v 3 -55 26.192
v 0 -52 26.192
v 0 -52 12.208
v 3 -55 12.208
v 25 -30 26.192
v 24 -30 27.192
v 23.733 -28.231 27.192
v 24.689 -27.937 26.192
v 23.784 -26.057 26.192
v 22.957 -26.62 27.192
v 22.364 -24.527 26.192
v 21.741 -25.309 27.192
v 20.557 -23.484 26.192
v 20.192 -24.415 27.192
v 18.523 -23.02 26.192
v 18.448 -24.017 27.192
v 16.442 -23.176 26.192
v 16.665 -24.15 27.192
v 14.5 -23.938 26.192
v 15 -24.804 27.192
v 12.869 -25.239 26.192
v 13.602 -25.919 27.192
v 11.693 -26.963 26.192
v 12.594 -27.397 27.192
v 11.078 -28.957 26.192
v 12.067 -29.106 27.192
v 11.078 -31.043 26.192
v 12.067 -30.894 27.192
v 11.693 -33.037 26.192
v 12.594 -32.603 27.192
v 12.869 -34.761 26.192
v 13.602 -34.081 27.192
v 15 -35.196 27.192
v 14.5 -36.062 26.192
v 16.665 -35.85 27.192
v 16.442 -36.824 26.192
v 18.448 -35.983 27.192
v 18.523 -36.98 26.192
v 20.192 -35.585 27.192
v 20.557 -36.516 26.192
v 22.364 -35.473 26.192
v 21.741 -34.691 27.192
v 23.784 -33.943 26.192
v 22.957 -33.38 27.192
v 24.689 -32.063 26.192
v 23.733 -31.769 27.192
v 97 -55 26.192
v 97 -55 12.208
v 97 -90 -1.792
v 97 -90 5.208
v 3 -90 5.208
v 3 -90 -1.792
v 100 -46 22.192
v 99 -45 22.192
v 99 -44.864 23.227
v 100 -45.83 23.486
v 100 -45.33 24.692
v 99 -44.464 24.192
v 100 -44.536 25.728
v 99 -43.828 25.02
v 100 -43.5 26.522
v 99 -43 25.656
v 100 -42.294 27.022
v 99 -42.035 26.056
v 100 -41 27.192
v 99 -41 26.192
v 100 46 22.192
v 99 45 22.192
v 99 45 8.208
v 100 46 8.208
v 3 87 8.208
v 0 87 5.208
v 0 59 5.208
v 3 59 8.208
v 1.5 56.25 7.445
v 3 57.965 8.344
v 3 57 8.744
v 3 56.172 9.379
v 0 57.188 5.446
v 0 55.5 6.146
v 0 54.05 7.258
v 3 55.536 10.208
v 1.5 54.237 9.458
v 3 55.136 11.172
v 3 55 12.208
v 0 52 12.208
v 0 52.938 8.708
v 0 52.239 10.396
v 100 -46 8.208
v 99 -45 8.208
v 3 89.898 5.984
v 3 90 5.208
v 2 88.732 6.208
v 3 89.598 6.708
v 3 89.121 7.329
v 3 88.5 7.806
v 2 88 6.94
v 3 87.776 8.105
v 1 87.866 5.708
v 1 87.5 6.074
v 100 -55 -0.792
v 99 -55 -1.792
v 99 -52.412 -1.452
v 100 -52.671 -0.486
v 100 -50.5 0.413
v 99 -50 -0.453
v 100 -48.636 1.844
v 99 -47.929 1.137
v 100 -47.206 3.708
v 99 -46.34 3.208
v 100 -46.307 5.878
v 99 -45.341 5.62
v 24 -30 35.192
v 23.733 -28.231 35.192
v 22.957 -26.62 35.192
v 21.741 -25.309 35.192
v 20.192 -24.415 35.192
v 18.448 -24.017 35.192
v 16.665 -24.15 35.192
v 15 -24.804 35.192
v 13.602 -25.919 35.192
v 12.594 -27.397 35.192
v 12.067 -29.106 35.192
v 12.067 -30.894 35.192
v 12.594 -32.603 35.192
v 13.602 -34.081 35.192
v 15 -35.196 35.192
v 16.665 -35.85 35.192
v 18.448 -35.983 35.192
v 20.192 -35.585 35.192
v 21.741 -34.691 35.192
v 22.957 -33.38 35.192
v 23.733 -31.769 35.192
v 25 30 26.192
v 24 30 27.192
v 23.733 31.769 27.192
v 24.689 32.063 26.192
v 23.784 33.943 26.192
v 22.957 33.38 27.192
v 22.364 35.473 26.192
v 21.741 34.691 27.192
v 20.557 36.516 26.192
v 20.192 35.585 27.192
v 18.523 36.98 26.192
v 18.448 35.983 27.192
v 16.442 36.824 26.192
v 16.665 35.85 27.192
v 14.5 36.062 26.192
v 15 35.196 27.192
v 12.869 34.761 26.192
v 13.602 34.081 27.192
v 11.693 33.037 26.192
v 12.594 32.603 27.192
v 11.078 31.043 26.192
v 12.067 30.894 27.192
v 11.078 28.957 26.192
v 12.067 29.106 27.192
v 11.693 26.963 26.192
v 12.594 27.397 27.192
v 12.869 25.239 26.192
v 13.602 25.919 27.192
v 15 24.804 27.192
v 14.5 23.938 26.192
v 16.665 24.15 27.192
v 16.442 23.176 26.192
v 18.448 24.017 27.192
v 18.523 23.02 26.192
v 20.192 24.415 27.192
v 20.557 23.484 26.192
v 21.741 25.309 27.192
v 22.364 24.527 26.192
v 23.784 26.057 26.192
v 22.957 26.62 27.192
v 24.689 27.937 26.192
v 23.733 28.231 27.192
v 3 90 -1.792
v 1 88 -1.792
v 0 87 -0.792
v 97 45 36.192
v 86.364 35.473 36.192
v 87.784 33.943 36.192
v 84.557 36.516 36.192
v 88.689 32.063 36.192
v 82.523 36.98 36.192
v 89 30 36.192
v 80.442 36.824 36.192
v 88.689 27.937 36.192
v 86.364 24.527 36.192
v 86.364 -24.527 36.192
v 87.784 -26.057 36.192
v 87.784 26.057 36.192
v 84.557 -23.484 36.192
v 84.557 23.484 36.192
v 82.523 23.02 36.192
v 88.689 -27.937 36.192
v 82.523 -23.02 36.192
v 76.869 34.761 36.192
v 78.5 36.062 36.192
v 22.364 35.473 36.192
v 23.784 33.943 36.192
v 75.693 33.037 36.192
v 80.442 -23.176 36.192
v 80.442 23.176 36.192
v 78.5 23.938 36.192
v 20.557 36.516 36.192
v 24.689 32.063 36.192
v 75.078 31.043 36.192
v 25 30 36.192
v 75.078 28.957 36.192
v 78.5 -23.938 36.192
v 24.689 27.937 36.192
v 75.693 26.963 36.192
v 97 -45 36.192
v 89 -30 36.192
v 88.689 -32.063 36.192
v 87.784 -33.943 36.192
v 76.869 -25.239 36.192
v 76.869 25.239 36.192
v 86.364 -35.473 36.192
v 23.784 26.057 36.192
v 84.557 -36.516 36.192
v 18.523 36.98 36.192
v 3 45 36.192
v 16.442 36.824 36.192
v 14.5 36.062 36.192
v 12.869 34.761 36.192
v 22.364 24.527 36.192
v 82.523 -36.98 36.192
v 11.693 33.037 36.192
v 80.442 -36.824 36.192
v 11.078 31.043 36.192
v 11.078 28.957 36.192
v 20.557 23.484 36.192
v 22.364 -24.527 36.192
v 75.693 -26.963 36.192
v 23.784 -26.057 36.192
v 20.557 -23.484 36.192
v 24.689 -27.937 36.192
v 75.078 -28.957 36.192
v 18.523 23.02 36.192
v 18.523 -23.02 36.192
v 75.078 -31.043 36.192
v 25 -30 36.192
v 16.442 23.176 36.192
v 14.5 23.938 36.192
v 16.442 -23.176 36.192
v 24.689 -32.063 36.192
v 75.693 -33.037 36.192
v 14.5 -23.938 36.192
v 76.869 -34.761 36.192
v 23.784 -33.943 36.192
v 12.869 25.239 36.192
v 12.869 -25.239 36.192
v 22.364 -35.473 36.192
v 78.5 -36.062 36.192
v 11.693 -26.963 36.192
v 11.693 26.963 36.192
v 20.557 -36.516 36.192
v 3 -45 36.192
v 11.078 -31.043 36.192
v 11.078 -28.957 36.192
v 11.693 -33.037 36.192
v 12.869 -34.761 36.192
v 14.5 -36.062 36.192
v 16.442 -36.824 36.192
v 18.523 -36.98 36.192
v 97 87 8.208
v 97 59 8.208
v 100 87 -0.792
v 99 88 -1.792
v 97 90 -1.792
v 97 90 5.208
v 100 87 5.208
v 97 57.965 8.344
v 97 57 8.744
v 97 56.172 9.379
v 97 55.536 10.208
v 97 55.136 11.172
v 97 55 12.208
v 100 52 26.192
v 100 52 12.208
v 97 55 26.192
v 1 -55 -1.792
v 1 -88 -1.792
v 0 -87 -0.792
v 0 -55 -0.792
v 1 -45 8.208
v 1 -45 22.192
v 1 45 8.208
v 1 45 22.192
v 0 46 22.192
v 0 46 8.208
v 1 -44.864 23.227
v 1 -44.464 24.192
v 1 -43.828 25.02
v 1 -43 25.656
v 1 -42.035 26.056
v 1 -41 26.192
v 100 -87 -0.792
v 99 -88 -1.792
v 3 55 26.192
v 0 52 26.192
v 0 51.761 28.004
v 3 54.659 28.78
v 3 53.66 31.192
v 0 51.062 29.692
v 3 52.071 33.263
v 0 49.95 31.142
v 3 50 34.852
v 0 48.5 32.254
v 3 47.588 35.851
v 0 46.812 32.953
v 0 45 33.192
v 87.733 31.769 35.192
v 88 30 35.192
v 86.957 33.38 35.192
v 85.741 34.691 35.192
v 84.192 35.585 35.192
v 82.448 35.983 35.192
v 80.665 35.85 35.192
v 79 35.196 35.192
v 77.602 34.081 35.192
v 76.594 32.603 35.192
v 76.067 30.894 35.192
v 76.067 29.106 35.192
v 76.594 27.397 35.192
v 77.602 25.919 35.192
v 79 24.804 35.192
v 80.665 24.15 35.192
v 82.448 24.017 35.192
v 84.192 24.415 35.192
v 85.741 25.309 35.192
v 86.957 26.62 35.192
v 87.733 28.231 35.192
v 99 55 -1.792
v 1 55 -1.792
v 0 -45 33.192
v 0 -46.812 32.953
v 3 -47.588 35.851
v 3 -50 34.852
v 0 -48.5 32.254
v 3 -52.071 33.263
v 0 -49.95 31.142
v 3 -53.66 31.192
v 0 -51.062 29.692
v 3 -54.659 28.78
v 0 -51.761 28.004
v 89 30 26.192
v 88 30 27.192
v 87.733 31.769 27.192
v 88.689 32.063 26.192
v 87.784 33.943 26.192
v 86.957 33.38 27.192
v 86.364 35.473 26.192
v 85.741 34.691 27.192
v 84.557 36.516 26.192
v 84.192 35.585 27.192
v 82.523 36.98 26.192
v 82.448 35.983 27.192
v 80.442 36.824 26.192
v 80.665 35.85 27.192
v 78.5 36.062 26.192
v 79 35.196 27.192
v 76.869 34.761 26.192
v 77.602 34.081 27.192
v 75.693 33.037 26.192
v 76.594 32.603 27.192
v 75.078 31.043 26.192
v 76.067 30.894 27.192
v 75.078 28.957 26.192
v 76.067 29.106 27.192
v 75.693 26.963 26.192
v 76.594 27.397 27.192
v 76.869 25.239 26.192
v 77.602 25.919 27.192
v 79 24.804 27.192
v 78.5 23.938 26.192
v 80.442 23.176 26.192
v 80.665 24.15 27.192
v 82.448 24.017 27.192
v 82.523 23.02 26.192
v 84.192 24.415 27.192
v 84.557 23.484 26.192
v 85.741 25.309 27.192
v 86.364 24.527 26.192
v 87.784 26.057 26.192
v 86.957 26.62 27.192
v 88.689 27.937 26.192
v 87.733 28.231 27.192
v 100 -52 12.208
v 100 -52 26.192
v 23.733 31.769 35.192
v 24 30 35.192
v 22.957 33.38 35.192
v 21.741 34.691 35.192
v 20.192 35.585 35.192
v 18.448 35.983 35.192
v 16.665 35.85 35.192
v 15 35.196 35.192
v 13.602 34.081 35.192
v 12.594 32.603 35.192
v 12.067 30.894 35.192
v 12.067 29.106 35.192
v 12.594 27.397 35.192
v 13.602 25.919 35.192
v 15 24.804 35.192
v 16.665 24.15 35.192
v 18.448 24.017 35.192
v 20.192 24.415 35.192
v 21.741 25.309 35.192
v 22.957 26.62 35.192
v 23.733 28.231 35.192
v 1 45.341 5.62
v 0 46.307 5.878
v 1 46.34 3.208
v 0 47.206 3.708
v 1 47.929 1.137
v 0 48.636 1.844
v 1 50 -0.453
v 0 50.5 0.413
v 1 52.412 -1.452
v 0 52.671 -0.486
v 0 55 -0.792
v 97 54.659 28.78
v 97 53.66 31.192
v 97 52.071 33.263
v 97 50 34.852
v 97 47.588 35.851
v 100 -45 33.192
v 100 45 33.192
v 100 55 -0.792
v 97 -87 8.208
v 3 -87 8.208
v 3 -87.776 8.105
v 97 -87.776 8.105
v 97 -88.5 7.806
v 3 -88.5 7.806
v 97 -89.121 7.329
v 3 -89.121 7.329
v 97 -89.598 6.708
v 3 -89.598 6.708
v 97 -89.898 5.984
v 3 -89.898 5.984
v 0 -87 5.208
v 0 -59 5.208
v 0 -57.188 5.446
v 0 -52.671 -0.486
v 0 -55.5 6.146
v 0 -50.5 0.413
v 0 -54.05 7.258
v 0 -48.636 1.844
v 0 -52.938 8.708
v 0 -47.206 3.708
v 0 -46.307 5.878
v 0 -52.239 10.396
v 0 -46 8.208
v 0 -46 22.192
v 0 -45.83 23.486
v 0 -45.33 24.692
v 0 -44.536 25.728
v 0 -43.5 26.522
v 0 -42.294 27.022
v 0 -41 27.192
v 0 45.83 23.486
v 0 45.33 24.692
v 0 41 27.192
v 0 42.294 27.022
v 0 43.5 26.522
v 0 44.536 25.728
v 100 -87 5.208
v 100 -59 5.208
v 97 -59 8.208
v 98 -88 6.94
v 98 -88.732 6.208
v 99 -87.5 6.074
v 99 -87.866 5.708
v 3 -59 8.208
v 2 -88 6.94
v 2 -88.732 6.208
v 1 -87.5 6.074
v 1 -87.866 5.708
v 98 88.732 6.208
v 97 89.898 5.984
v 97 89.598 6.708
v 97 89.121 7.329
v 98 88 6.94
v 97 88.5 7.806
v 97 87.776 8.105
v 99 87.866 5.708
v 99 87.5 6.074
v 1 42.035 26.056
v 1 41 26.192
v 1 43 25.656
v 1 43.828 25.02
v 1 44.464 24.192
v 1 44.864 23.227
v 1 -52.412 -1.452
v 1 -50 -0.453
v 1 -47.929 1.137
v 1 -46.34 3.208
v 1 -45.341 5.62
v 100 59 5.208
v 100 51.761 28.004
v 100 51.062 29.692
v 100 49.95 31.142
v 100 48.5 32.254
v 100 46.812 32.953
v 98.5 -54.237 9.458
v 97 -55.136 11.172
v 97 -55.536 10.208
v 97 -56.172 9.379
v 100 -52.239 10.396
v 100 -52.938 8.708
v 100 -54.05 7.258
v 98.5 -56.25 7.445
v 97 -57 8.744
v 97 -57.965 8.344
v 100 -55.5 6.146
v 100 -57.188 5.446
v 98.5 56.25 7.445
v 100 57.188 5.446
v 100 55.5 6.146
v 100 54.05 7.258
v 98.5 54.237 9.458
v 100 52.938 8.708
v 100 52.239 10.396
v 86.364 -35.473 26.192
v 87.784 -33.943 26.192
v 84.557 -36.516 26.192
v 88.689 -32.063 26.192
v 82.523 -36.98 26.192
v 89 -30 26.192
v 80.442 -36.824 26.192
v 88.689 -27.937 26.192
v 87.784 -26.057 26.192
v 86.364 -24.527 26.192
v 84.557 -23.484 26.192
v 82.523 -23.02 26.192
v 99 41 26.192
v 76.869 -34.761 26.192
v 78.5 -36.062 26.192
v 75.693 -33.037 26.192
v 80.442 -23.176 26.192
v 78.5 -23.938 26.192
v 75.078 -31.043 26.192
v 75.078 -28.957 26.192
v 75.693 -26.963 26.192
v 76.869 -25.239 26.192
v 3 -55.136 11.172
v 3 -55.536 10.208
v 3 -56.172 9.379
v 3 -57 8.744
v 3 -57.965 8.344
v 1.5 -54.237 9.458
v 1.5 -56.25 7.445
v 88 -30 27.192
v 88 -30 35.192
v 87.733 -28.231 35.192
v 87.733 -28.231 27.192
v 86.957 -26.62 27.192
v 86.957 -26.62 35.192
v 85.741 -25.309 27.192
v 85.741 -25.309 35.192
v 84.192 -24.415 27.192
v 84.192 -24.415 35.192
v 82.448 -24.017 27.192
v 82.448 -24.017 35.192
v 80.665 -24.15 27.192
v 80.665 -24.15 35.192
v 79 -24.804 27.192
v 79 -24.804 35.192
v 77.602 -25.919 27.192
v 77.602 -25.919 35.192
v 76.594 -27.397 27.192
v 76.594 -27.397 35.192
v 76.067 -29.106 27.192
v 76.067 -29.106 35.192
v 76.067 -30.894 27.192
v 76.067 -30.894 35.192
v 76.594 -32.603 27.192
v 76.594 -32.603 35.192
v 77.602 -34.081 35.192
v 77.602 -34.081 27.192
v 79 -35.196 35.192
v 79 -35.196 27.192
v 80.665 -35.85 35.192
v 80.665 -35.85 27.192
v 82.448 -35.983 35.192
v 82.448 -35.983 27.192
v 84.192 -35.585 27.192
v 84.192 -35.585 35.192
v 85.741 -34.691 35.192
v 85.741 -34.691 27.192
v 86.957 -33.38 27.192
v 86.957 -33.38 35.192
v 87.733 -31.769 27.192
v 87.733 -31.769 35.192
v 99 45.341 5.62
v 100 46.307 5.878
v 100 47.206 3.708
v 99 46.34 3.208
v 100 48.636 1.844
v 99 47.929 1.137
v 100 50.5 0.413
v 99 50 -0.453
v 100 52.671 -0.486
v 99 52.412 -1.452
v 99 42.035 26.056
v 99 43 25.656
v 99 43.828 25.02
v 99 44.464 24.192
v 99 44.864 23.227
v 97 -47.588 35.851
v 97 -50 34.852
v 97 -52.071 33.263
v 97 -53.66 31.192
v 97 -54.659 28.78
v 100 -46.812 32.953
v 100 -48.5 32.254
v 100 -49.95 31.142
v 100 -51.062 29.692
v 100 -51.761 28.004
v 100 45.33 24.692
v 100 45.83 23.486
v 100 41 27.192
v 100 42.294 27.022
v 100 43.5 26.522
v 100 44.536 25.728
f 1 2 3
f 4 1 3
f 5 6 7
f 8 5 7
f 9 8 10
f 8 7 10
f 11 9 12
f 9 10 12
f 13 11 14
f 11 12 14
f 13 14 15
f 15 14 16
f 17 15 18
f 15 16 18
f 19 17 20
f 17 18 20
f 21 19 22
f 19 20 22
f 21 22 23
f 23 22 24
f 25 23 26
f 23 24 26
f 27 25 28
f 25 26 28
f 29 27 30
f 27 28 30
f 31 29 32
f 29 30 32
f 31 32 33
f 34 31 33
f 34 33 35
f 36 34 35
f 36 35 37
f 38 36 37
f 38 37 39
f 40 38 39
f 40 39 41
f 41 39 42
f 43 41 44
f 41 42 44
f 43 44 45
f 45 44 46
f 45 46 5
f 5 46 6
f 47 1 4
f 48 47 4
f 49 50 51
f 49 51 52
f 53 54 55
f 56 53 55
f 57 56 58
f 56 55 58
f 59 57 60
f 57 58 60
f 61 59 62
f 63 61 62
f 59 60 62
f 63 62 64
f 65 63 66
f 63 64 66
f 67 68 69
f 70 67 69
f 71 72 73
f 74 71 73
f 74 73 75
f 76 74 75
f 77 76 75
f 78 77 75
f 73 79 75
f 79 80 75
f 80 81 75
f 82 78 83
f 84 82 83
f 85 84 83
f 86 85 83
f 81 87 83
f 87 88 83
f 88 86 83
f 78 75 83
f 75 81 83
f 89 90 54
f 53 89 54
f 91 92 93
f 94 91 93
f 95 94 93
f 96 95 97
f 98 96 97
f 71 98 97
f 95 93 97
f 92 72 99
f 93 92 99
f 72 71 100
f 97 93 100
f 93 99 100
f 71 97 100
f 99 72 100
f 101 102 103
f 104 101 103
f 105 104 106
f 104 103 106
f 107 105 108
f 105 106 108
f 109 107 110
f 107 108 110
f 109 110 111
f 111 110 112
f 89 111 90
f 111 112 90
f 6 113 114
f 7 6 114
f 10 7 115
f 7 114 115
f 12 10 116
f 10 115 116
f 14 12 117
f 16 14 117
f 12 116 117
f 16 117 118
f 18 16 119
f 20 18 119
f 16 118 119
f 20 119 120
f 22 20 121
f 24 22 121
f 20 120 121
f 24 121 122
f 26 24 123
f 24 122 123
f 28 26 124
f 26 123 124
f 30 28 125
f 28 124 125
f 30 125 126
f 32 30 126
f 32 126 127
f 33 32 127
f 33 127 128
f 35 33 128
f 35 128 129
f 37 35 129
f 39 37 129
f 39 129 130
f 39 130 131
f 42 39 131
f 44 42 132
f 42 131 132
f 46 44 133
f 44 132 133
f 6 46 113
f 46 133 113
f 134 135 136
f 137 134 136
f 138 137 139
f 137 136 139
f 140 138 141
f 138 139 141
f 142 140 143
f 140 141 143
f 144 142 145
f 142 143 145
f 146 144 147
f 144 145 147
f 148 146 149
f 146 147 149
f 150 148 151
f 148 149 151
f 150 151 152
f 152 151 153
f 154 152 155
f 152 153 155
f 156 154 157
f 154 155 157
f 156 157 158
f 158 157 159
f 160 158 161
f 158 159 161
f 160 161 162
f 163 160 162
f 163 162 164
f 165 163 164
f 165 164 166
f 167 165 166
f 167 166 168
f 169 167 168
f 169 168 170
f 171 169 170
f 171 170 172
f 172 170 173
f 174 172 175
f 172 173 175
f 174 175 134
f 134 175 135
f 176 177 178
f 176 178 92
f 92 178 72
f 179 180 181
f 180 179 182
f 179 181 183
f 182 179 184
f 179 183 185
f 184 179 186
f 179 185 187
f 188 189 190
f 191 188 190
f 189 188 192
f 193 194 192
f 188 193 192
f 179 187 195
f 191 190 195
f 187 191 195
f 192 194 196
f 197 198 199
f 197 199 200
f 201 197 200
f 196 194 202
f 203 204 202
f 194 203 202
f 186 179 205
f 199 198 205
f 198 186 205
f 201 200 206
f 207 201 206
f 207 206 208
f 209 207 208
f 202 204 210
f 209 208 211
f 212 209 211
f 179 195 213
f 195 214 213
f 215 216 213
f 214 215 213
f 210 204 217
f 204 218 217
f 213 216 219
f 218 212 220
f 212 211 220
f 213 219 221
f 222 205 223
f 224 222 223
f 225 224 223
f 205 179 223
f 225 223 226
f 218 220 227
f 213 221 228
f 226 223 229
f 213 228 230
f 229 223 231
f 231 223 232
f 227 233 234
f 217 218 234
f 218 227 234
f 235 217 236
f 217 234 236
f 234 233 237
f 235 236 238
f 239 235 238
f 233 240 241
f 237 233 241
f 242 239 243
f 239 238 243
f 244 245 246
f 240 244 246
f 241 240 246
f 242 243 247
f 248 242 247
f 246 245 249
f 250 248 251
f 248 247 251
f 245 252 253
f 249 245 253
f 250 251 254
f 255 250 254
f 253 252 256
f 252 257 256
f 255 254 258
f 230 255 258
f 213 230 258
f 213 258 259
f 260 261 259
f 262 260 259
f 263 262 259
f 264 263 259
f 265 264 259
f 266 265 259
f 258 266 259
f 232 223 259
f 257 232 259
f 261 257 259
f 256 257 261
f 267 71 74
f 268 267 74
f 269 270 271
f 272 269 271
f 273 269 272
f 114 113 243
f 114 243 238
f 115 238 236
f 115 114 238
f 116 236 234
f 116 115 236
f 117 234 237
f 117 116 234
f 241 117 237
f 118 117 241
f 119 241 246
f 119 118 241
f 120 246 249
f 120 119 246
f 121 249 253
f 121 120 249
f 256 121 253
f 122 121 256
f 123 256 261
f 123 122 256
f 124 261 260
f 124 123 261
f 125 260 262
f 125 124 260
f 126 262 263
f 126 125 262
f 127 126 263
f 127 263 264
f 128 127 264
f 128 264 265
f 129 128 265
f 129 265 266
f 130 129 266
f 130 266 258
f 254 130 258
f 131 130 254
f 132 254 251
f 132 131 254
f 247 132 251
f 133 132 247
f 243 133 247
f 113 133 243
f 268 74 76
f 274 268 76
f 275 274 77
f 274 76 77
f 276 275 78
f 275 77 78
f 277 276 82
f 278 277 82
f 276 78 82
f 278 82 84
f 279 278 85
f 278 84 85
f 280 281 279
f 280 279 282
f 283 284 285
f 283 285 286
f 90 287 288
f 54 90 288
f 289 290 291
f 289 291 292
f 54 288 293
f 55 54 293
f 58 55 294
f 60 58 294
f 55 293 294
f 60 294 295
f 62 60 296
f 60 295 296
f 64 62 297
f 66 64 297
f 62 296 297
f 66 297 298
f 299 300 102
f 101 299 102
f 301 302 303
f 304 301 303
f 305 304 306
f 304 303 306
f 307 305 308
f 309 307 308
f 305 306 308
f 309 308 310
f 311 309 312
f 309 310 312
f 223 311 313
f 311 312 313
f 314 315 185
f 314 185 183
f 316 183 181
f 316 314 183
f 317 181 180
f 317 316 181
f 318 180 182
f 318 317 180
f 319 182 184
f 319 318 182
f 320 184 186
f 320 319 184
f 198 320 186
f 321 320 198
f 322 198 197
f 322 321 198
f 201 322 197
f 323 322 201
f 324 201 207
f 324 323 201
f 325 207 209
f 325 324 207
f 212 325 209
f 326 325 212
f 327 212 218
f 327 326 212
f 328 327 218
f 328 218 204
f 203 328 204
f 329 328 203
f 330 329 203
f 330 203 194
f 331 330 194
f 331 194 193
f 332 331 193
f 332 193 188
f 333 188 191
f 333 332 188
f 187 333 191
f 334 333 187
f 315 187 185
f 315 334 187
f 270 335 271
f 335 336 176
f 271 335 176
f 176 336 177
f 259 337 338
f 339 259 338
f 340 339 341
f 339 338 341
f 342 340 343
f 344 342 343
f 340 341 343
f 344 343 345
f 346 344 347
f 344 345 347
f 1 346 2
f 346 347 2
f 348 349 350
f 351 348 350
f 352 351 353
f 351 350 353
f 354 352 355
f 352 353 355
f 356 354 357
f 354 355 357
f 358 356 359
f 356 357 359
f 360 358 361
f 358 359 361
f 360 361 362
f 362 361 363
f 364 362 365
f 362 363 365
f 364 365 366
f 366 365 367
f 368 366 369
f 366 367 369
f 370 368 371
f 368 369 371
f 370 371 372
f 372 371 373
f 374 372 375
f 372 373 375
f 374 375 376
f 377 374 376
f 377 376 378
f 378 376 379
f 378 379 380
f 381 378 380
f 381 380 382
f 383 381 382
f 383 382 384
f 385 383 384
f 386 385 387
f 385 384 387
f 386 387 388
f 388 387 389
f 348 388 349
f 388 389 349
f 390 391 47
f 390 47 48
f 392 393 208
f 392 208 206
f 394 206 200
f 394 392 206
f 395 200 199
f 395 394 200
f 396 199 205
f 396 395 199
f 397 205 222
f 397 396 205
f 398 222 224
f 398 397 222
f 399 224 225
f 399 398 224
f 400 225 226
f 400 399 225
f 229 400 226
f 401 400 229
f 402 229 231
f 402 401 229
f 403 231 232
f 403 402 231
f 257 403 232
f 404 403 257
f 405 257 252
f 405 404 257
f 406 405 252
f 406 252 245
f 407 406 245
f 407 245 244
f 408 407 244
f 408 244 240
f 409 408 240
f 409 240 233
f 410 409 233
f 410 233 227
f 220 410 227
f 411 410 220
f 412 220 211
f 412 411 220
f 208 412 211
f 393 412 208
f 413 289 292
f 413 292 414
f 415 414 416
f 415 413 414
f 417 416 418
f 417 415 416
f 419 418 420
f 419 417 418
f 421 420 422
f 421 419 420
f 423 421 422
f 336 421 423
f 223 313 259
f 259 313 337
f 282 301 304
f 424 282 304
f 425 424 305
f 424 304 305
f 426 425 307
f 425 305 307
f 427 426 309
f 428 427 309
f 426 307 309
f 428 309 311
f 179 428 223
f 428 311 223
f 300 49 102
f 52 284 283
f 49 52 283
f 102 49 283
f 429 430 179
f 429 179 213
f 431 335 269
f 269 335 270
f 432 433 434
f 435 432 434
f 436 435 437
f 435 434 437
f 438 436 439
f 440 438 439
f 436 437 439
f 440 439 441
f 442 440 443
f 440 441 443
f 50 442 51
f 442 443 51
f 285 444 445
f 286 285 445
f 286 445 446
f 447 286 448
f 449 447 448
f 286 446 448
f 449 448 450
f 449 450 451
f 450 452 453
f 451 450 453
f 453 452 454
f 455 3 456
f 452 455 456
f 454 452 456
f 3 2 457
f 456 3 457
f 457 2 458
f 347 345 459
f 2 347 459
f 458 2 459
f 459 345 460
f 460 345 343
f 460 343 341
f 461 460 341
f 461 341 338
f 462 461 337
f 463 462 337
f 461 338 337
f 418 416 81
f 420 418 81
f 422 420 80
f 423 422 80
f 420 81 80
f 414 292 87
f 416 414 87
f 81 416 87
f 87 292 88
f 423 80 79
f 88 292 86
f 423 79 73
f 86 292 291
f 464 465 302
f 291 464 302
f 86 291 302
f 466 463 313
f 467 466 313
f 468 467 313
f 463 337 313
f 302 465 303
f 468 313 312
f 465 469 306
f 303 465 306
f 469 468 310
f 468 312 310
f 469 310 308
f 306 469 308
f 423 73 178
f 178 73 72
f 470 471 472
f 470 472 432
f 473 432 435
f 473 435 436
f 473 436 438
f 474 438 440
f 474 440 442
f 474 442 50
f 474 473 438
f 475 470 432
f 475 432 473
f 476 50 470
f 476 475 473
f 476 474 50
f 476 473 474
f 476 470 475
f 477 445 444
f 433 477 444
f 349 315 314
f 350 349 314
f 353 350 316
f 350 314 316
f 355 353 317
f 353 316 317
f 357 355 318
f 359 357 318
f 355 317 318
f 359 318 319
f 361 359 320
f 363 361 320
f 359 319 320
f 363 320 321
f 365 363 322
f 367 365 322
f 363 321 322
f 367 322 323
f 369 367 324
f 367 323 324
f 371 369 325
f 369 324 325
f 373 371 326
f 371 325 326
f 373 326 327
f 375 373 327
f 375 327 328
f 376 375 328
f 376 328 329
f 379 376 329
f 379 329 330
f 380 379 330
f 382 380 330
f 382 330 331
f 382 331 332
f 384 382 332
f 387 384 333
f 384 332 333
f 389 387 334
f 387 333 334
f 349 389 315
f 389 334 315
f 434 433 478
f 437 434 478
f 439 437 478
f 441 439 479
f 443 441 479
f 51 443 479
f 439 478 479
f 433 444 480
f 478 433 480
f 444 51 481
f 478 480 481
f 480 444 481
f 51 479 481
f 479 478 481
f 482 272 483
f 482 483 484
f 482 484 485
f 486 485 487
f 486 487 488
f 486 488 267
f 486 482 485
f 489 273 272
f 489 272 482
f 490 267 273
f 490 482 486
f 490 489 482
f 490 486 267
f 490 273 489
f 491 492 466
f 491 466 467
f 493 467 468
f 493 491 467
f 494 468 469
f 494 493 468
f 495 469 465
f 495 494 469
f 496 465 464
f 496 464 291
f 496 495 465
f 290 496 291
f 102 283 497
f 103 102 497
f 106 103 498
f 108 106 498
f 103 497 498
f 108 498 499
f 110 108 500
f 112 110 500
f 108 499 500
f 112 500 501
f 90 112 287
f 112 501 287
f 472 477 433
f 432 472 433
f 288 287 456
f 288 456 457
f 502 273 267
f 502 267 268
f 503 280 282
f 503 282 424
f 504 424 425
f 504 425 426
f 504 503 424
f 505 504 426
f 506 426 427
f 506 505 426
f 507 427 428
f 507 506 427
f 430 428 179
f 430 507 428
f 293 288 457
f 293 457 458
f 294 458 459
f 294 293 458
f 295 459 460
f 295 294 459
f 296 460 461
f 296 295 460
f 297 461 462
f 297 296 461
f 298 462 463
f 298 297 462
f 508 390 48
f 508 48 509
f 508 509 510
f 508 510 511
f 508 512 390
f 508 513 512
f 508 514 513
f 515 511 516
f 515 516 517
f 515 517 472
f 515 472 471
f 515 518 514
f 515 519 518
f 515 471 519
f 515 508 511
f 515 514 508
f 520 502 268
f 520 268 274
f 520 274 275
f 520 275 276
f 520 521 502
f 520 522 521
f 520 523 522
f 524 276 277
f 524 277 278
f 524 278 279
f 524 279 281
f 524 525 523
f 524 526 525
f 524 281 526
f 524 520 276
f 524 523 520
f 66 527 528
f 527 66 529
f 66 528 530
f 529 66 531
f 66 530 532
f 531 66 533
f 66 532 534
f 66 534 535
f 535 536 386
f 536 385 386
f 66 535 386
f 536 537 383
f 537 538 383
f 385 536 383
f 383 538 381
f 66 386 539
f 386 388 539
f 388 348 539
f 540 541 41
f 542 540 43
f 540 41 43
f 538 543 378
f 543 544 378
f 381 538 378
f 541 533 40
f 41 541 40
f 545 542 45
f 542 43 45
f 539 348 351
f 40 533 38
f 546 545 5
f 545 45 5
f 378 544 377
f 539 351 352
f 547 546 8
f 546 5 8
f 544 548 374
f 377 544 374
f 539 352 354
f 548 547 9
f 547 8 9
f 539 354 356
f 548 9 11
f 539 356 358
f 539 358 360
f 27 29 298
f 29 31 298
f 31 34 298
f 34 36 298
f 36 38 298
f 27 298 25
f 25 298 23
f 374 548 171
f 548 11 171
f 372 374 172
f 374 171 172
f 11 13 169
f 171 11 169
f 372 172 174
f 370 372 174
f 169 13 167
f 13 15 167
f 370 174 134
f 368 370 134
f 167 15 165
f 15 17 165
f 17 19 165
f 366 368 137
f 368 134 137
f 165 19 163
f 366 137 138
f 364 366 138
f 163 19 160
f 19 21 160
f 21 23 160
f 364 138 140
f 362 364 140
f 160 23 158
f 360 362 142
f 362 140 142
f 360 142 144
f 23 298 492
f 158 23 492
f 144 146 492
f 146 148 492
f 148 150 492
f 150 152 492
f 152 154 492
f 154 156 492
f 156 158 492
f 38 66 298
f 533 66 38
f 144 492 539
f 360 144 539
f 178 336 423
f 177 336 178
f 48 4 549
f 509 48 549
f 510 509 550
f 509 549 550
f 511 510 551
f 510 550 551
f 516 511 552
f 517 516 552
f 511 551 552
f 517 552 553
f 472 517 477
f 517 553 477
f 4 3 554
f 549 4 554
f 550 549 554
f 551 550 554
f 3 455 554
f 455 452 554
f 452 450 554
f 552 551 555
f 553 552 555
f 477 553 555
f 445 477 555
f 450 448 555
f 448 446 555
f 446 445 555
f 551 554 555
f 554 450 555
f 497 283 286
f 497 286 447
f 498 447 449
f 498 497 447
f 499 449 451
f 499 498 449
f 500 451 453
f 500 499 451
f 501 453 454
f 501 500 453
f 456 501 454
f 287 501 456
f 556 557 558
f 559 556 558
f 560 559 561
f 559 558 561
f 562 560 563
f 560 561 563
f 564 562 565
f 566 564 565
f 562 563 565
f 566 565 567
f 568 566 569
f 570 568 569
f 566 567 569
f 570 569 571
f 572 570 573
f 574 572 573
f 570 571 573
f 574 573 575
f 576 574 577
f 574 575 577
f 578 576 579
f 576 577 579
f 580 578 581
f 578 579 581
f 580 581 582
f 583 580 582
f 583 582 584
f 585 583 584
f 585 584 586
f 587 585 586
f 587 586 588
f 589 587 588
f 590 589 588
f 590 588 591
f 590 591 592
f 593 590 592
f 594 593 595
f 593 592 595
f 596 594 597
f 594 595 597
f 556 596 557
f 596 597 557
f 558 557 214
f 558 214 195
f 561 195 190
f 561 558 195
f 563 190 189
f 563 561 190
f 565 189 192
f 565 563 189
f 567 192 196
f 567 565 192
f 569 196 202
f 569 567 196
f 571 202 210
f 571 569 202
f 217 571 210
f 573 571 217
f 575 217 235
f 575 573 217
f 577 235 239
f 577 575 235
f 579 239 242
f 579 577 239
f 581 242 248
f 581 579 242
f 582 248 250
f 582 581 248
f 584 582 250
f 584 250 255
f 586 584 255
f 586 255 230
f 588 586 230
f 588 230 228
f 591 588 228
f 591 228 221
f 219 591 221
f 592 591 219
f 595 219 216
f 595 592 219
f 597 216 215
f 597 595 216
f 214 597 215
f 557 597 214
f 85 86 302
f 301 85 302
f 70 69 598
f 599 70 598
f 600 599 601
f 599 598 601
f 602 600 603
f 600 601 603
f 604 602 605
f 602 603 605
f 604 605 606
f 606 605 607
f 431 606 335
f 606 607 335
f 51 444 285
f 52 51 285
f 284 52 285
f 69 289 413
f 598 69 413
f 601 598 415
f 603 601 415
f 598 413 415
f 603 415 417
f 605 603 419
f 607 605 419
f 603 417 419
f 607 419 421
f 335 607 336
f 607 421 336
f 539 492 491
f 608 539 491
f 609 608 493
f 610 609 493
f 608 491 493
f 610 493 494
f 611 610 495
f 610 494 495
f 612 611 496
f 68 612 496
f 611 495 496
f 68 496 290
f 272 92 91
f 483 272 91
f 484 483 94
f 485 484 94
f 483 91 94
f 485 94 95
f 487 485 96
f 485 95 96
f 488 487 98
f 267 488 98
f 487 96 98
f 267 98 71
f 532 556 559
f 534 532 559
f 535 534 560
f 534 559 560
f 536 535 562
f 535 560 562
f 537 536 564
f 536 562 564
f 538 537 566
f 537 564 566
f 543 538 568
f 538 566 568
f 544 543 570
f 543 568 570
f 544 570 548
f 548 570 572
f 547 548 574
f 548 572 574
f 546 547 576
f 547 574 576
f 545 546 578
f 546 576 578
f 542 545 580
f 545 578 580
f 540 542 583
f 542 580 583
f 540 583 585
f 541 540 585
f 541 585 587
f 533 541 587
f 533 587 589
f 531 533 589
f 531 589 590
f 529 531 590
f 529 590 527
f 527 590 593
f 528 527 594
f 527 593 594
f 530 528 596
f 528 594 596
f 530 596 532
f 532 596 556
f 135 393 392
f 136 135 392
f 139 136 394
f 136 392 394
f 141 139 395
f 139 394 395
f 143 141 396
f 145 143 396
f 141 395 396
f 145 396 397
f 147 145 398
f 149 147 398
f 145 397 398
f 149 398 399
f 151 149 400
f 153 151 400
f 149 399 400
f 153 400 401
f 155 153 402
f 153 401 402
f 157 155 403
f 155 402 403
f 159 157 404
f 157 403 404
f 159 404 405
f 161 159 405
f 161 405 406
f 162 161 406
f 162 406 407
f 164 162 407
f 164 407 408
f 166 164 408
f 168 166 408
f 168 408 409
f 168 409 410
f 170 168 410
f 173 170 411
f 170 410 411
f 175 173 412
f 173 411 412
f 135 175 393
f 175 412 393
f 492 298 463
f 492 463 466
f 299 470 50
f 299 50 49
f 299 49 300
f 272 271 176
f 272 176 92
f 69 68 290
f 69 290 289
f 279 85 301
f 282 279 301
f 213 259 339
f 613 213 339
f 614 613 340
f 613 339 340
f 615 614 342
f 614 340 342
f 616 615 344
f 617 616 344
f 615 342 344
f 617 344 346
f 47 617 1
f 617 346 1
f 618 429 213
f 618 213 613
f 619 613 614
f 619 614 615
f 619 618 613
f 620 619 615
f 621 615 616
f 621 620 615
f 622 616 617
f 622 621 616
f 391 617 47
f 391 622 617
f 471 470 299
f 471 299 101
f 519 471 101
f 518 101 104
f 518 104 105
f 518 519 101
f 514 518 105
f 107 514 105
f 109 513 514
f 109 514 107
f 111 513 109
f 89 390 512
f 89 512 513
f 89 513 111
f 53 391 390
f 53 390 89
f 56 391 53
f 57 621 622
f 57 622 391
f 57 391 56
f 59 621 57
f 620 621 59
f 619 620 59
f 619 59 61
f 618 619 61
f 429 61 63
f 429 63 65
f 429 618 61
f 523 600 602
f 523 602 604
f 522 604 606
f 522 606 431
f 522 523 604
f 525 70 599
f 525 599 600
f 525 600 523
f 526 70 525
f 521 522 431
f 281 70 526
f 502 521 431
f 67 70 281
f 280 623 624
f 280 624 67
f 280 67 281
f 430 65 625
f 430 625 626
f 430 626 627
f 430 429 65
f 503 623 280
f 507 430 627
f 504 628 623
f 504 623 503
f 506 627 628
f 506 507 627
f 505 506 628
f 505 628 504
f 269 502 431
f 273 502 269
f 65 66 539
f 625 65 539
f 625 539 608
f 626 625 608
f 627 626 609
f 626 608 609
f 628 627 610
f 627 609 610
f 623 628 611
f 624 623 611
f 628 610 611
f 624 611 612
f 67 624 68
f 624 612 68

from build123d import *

# Parameters (mm, degrees)
F1_DEPTH = 100
F2_SIZE  = 2.99999
F3_SIZE  = 1
F4_R     = 6
F5_DEPTH = 10
F6_SIZE  = 1


# Not quite as in the source:
# - a fillet or chamfer is up to 0.001 mm smaller than in the source, because OpenCascade refuses the exact size


with BuildPart() as f1:
    # F0 (on Right) → F1 (new body)
    with BuildSketch(Plane.YZ):
        with BuildLine():
            Line((45, 36.1919924617), (0, 36.1919924617))
            Line((0, 36.1919924617), (0, 26.1919924617))
            Line((0, 26.1919924617), (41, 26.1919924617))
            ThreePointArc((41, 26.1919924617), (43.8284271247, 25.0204195864), (45, 22.1919924617))
            Line((45, 22.1919924617), (45, 8.2077106759))
            ThreePointArc((45, 8.2077106759), (47.9289321881, 1.136642864), (55, -1.7922893241))
            Line((55, -1.7922893241), (90, -1.7922893241))
            Line((90, -1.7922893241), (90, 5.2077106759))
            ThreePointArc((90, 5.2077106759), (89.1213203436, 7.3290310195), (87, 8.2077106759))
            Line((87, 8.2077106759), (59, 8.2077106759))
            ThreePointArc((59, 8.2077106759), (56.1715728753, 9.3792835511), (55, 12.2077106759))
            Line((55, 12.2077106759), (55, 26.1919924617))
            ThreePointArc((55, 26.1919924617), (52.0710678119, 33.2630602735), (45, 36.1919924617))
        make_face()
        with BuildLine():
            Line((0, 26.1919924617), (0, 36.1919924617))
            Line((0, 36.1919924617), (-45, 36.1919924617))
            ThreePointArc((-45, 36.1919924617), (-52.0710678119, 33.2630602735), (-55, 26.1919924617))
            Line((-55, 26.1919924617), (-55, 12.2077106759))
            ThreePointArc((-55, 12.2077106759), (-56.1715728753, 9.3792835511), (-59, 8.2077106759))
            Line((-59, 8.2077106759), (-87, 8.2077106759))
            ThreePointArc((-87, 8.2077106759), (-89.1213203436, 7.3290310195), (-90, 5.2077106759))
            Line((-90, 5.2077106759), (-90, -1.7922893241))
            Line((-90, -1.7922893241), (-55, -1.7922893241))
            ThreePointArc((-55, -1.7922893241), (-47.9289321881, 1.136642864), (-45, 8.2077106759))
            Line((-45, 8.2077106759), (-45, 22.1919924617))
            ThreePointArc((-45, 22.1919924617), (-43.8284271247, 25.0204195864), (-41, 26.1919924617))
            Line((-41, 26.1919924617), (0, 26.1919924617))
        make_face()
    extrude(amount=F1_DEPTH)

    # F2 (size 3 in the source; OpenCascade refuses exactly that, so slightly less here)
    f2_edges = [f1.edges().sort_by_distance(p)[0] for p in [
        (0, -90, 1.707711),
        (0, -89.12132, 7.329031),
        (0, -73, 8.207711),
        (0, -56.171573, 9.379284),
        (0, -55, 19.199852),
        (0, -52.071068, 33.26306),
        (0, 0, 36.191992),
        (0, 52.071068, 33.26306),
        (100, 0, 36.191992),
    ]]
    chamfer(f2_edges, length=F2_SIZE)

    # F3
    f3_edges = [f1.edges().sort_by_distance(p)[0] for p in [
        (100, 0, 26.191992),
        (0, 0, 26.191992),
    ]]
    chamfer(f3_edges, length=F3_SIZE)

    # F4 (on face) → F5 (cut)
    with BuildSketch(Plane.XY.offset(36.1919924617)):
        with Locations((18, -30)):
            Circle(F4_R)
        with Locations((82, -30)):
            Circle(F4_R)
        with Locations((82, 30)):
            Circle(F4_R)
        with Locations((18, 30)):
            Circle(F4_R)
    extrude(amount=-F5_DEPTH, mode=Mode.SUBTRACT)

    # F6
    f6_edges = [f1.edges().sort_by_distance(p)[0] for p in [
        (12, 30, 36.191992),
        (76, 30, 36.191992),
        (88, -30, 31.191992),
        (76, -30, 36.191992),
        (76, -30, 26.191992),
        (12, -30, 36.191992),
        (76, 30, 26.191992),
        (12, 30, 26.191992),
        (12, -30, 26.191992),
    ]]
    chamfer(f6_edges, length=F6_SIZE)


solid = f1.part
